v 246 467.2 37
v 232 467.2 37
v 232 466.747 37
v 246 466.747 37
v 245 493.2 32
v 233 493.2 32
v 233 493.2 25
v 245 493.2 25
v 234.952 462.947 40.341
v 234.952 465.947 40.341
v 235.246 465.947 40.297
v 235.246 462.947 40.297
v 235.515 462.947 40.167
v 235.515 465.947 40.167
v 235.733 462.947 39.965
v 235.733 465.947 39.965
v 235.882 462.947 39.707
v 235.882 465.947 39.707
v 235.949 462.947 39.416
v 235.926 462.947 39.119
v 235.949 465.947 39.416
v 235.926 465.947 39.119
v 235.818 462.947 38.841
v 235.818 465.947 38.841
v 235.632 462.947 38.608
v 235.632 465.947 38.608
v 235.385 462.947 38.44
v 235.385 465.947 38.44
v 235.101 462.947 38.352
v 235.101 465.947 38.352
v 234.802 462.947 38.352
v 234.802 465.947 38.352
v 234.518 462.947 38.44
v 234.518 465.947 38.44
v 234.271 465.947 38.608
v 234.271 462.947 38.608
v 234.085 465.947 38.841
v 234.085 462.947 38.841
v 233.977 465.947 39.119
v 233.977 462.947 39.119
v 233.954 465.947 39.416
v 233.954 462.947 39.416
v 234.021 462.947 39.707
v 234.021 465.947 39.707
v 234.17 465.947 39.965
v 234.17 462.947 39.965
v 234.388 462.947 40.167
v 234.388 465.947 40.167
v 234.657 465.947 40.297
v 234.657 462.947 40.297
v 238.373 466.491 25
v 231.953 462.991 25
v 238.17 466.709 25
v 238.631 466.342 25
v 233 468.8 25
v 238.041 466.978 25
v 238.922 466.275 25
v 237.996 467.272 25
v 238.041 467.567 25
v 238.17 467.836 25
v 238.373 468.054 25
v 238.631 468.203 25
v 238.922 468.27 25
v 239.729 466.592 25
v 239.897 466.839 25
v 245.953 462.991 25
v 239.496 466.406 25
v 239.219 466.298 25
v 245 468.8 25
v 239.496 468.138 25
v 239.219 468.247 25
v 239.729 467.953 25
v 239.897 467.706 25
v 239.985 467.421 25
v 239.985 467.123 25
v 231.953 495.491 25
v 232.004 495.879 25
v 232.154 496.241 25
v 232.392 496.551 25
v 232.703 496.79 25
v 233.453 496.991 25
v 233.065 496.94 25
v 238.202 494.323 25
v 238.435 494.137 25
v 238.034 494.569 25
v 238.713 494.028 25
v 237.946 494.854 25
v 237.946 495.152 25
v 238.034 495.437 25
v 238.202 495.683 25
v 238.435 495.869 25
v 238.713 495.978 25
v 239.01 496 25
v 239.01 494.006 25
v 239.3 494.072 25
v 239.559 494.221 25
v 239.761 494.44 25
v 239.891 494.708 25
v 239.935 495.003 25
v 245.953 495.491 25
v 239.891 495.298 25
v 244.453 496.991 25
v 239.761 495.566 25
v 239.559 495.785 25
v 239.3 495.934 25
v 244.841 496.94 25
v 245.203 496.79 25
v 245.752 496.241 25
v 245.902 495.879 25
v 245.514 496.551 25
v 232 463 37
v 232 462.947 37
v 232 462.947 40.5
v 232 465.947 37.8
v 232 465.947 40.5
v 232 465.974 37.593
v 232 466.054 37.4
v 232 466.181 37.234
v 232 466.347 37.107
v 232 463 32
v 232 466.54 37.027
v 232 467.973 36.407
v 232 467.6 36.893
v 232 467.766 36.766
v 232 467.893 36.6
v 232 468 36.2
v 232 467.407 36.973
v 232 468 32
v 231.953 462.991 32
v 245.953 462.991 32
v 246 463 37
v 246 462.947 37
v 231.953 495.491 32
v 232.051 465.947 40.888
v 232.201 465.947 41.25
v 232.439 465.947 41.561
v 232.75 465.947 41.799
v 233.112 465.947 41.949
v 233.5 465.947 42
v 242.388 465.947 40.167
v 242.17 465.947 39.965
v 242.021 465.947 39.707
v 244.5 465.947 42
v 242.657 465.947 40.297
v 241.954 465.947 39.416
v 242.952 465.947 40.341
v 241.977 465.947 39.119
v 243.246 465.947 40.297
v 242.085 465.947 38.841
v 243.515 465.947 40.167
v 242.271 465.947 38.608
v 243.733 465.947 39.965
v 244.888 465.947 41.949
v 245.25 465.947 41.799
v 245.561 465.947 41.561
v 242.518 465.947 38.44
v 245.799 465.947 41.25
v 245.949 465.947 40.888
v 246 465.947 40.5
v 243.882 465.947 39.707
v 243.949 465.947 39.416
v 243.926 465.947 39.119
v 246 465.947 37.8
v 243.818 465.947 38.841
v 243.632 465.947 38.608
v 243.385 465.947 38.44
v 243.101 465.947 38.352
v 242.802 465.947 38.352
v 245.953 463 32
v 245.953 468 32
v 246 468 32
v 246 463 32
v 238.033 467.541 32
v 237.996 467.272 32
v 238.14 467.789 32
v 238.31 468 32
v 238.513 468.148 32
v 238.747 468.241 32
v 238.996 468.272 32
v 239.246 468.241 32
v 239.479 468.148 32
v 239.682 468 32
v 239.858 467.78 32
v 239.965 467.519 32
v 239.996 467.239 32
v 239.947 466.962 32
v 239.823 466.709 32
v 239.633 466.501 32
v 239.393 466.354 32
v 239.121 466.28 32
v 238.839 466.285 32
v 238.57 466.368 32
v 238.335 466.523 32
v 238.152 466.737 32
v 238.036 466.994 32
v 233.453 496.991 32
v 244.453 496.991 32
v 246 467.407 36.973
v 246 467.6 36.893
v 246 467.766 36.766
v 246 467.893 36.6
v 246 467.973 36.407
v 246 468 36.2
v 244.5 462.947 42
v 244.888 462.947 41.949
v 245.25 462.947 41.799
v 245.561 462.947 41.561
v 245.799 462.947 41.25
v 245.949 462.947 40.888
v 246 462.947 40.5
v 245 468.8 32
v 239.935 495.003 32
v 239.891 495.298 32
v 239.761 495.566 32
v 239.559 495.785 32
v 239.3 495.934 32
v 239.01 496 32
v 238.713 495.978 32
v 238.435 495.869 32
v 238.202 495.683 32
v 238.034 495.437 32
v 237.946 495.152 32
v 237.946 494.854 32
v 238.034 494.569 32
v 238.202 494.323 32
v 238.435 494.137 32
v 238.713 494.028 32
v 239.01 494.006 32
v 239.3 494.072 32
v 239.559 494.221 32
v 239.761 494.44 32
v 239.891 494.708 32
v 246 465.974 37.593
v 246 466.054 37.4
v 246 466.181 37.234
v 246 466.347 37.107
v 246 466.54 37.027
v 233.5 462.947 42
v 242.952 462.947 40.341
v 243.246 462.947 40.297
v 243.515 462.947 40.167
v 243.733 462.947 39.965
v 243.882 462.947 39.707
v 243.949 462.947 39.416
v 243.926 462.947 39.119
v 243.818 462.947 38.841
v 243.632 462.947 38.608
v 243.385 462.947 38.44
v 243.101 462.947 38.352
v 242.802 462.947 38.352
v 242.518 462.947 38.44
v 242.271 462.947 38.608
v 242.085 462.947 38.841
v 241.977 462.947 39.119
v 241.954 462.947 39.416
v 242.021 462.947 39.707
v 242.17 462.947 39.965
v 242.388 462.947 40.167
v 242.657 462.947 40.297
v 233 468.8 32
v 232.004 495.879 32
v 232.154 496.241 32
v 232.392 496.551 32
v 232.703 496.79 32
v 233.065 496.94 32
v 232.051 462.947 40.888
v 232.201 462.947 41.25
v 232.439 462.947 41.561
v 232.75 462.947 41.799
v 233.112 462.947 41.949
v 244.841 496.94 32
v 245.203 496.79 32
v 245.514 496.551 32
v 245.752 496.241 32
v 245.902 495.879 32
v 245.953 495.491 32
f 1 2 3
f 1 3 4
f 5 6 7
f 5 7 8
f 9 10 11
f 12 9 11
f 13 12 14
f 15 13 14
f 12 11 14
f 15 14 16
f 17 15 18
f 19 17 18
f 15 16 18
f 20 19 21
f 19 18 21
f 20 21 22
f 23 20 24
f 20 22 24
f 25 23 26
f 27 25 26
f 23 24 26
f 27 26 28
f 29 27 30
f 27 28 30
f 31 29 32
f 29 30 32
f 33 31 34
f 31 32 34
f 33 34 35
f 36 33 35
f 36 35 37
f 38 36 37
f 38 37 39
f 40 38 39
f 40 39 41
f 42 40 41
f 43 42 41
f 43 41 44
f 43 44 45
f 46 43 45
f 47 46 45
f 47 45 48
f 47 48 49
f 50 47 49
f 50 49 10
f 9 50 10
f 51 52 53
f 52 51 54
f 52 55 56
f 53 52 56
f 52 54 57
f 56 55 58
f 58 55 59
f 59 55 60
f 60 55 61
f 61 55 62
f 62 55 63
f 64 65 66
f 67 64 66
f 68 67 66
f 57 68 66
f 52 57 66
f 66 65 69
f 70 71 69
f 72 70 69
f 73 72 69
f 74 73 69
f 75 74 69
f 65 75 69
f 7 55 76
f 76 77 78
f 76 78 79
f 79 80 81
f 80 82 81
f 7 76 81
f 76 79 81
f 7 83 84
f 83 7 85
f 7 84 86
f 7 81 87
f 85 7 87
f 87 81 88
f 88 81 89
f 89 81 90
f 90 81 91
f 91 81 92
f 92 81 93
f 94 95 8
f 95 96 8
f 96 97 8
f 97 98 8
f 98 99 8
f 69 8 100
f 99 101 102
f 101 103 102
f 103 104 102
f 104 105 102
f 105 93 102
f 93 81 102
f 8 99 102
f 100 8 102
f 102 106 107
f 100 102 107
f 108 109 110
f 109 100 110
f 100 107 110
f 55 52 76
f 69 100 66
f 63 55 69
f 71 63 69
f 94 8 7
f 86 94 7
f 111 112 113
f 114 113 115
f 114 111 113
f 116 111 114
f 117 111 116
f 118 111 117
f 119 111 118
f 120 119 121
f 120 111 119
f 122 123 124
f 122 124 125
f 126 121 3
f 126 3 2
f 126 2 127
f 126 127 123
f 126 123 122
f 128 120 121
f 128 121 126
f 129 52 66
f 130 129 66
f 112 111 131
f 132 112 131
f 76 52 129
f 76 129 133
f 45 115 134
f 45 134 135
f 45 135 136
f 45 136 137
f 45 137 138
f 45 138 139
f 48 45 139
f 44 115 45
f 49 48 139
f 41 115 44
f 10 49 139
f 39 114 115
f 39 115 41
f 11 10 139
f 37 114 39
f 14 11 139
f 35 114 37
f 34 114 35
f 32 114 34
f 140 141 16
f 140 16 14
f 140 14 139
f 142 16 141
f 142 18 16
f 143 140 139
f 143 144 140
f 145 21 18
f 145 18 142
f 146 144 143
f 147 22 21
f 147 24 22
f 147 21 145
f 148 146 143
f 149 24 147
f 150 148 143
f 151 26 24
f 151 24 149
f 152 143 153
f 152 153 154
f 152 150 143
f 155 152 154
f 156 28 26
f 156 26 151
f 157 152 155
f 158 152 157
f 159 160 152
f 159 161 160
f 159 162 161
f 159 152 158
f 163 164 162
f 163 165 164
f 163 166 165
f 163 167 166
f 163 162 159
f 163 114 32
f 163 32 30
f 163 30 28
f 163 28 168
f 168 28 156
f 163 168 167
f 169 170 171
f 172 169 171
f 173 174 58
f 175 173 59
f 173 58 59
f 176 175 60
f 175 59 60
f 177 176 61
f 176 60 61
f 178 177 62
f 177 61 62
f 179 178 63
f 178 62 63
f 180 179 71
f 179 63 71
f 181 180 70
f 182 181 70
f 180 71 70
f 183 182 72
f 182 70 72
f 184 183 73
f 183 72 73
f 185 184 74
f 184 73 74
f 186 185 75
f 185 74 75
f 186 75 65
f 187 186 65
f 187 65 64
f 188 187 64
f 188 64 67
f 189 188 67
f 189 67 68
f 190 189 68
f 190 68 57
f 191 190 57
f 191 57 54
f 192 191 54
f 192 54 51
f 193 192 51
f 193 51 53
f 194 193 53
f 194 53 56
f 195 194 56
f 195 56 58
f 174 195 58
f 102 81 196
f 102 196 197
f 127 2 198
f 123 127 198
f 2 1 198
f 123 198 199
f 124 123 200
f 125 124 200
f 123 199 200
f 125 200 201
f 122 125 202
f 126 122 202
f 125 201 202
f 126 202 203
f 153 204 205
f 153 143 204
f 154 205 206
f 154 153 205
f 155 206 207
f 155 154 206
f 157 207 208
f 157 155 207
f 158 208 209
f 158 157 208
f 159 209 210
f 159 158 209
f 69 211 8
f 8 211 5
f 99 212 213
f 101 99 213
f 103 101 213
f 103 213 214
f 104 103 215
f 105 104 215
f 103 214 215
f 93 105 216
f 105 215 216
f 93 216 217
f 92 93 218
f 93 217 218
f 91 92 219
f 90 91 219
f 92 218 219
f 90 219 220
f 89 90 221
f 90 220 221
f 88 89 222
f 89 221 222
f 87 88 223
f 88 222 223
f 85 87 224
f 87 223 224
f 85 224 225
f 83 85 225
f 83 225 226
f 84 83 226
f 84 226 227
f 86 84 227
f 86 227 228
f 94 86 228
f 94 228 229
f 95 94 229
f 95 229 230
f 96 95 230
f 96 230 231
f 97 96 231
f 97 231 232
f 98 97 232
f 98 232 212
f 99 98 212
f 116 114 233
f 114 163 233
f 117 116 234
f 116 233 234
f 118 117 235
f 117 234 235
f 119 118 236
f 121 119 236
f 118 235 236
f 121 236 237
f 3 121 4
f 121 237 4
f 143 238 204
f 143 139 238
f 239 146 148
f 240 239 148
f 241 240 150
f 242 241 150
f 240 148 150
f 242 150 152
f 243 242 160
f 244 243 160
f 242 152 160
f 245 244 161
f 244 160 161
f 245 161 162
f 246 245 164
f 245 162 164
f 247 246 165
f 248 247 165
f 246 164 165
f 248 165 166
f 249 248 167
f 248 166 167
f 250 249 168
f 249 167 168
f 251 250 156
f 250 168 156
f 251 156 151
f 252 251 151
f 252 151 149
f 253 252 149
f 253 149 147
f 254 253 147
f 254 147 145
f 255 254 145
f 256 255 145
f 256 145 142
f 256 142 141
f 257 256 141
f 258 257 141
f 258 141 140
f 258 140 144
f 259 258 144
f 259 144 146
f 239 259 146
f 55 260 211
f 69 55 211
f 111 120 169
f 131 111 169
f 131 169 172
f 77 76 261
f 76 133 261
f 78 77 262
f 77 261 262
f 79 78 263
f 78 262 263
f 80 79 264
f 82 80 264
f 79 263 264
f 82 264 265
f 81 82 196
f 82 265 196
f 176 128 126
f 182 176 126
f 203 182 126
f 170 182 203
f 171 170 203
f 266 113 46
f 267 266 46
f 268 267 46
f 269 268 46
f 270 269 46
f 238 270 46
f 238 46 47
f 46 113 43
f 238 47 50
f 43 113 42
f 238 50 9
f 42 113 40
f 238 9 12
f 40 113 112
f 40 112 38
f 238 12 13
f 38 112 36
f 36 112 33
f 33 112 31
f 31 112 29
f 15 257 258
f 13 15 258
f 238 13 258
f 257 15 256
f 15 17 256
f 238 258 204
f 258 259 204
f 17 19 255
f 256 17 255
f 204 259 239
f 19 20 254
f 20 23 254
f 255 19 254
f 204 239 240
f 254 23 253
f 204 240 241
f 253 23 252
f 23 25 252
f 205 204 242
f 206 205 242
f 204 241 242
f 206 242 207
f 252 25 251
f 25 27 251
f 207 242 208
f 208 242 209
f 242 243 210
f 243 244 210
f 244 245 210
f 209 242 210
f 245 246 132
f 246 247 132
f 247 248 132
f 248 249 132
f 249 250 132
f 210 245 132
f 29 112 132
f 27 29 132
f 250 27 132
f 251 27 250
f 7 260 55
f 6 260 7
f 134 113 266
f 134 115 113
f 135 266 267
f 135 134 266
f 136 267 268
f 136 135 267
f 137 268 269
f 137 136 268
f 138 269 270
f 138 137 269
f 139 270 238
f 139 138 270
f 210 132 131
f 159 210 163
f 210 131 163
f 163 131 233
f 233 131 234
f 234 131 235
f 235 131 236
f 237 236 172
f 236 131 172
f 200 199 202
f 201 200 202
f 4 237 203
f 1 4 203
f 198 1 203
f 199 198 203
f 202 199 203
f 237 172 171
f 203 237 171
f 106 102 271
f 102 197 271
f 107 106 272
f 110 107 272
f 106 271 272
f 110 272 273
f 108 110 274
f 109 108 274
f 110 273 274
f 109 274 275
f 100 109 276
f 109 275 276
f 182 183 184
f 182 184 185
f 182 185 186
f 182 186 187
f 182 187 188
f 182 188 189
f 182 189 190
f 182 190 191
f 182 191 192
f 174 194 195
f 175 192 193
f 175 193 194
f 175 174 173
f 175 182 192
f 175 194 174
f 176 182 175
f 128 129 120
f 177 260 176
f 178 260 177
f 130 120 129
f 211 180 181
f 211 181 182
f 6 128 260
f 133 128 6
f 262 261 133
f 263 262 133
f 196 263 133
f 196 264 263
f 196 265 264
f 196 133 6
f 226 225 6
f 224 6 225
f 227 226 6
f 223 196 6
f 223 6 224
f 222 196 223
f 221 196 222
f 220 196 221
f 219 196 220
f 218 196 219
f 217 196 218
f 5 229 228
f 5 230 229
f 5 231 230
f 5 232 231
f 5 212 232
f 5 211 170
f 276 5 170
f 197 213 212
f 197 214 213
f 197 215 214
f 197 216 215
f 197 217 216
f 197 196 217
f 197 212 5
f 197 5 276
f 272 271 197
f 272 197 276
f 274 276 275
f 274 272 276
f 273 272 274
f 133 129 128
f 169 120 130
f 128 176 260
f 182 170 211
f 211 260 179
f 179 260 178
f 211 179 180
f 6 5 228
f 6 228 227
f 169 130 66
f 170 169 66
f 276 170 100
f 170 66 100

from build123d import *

# Parameters (mm, degrees)
SKETCH1_W           = 14
SKETCH1_H           = 34
BOSS_EXTRUDE1_DEPTH = 7
SKETCH2_R           = 1
SKETCH2_W           = 12
SKETCH2_H           = 24.4
CUT_EXTRUDE1_DEPTH  = 555.564285541
SKETCH3_W           = 14
SKETCH3_H           = 5
BOSS_EXTRUDE2_DEPTH = 5
SKETCH4_W           = 14
SKETCH4_H           = 3
BOSS_EXTRUDE3_DEPTH = 5
FILLET1_R           = 1.5
FILLET2_R           = 0.8
SKETCH5_R           = 1
CUT_EXTRUDE2_DEPTH  = 7
SKETCH6_R           = 1
CUT_EXTRUDE3_DEPTH  = 252.483055086


with BuildPart() as part:
    # Sketch1 → Boss-Extrude1 (new body)
    with BuildSketch(Plane.XY.offset(25)):
        with Locations((238.952994655, 479.990614818)):
            Rectangle(SKETCH1_W, SKETCH1_H)
    extrude(amount=BOSS_EXTRUDE1_DEPTH)

    # Sketch2 → Cut-Extrude1 (cut, through all)
    with BuildSketch(Plane.XY.offset(32)):
        with Locations((238.935079192, 495.003072258)):
            Circle(SKETCH2_R)
        with Locations((239, 481.000012207)):
            Rectangle(SKETCH2_W, SKETCH2_H)
    extrude(amount=-CUT_EXTRUDE1_DEPTH, mode=Mode.SUBTRACT)

    # Sketch3 → Boss-Extrude2 (add)
    with BuildSketch(Plane.XY.offset(32)):
        with Locations((239, 465.5)):
            Rectangle(SKETCH3_W, SKETCH3_H)
    extrude(amount=BOSS_EXTRUDE2_DEPTH)

    # Sketch4 → Boss-Extrude3 (add)
    with BuildSketch(Plane.XY.offset(37)):
        with Locations((239, 464.446662177)):
            Rectangle(SKETCH4_W, SKETCH4_H)
    extrude(amount=BOSS_EXTRUDE3_DEPTH)

    # Fillet1
    fillet1_edges = [part.edges().sort_by_distance(p)[0] for p in [
        (232, 464.446662177, 42),
        (246, 464.446662177, 42),
        (231.952994655, 496.990614818, 28.5),
        (245.952994655, 496.990614818, 28.5),
    ]]
    fillet(fillet1_edges, radius=FILLET1_R)

    # Fillet2
    fillet2_edges = [part.edges().sort_by_distance(p)[0] for p in [
        (239, 468, 37),
        (239, 465.946662177, 37),
    ]]
    fillet(fillet2_edges, radius=FILLET2_R)

    # Sketch5 → Cut-Extrude2 (cut)
    with BuildSketch(Plane(origin=(0, 0, 25), x_dir=(-1, 0, 0), z_dir=(0, 0, -1))):
        with Locations((-238.99635452, 467.272454622)):
            Circle(SKETCH5_R)
    extrude(amount=-CUT_EXTRUDE2_DEPTH, mode=Mode.SUBTRACT)

    # Sketch6 → Cut-Extrude3 (cut, through all)
    with BuildSketch(Plane(origin=(0, 465.946662177, 0), x_dir=(1, 0, 0), z_dir=(0, 1, 0))):
        with Locations(Location((234.951502539, -39.341225233, 0), (0, 0, 270))):
            Circle(SKETCH6_R)
        with Locations(Location((242.951502539, -39.341225233, 0), (0, 0, 270))):
            Circle(SKETCH6_R)
    extrude(amount=-CUT_EXTRUDE3_DEPTH, mode=Mode.SUBTRACT)


solid = part.part
